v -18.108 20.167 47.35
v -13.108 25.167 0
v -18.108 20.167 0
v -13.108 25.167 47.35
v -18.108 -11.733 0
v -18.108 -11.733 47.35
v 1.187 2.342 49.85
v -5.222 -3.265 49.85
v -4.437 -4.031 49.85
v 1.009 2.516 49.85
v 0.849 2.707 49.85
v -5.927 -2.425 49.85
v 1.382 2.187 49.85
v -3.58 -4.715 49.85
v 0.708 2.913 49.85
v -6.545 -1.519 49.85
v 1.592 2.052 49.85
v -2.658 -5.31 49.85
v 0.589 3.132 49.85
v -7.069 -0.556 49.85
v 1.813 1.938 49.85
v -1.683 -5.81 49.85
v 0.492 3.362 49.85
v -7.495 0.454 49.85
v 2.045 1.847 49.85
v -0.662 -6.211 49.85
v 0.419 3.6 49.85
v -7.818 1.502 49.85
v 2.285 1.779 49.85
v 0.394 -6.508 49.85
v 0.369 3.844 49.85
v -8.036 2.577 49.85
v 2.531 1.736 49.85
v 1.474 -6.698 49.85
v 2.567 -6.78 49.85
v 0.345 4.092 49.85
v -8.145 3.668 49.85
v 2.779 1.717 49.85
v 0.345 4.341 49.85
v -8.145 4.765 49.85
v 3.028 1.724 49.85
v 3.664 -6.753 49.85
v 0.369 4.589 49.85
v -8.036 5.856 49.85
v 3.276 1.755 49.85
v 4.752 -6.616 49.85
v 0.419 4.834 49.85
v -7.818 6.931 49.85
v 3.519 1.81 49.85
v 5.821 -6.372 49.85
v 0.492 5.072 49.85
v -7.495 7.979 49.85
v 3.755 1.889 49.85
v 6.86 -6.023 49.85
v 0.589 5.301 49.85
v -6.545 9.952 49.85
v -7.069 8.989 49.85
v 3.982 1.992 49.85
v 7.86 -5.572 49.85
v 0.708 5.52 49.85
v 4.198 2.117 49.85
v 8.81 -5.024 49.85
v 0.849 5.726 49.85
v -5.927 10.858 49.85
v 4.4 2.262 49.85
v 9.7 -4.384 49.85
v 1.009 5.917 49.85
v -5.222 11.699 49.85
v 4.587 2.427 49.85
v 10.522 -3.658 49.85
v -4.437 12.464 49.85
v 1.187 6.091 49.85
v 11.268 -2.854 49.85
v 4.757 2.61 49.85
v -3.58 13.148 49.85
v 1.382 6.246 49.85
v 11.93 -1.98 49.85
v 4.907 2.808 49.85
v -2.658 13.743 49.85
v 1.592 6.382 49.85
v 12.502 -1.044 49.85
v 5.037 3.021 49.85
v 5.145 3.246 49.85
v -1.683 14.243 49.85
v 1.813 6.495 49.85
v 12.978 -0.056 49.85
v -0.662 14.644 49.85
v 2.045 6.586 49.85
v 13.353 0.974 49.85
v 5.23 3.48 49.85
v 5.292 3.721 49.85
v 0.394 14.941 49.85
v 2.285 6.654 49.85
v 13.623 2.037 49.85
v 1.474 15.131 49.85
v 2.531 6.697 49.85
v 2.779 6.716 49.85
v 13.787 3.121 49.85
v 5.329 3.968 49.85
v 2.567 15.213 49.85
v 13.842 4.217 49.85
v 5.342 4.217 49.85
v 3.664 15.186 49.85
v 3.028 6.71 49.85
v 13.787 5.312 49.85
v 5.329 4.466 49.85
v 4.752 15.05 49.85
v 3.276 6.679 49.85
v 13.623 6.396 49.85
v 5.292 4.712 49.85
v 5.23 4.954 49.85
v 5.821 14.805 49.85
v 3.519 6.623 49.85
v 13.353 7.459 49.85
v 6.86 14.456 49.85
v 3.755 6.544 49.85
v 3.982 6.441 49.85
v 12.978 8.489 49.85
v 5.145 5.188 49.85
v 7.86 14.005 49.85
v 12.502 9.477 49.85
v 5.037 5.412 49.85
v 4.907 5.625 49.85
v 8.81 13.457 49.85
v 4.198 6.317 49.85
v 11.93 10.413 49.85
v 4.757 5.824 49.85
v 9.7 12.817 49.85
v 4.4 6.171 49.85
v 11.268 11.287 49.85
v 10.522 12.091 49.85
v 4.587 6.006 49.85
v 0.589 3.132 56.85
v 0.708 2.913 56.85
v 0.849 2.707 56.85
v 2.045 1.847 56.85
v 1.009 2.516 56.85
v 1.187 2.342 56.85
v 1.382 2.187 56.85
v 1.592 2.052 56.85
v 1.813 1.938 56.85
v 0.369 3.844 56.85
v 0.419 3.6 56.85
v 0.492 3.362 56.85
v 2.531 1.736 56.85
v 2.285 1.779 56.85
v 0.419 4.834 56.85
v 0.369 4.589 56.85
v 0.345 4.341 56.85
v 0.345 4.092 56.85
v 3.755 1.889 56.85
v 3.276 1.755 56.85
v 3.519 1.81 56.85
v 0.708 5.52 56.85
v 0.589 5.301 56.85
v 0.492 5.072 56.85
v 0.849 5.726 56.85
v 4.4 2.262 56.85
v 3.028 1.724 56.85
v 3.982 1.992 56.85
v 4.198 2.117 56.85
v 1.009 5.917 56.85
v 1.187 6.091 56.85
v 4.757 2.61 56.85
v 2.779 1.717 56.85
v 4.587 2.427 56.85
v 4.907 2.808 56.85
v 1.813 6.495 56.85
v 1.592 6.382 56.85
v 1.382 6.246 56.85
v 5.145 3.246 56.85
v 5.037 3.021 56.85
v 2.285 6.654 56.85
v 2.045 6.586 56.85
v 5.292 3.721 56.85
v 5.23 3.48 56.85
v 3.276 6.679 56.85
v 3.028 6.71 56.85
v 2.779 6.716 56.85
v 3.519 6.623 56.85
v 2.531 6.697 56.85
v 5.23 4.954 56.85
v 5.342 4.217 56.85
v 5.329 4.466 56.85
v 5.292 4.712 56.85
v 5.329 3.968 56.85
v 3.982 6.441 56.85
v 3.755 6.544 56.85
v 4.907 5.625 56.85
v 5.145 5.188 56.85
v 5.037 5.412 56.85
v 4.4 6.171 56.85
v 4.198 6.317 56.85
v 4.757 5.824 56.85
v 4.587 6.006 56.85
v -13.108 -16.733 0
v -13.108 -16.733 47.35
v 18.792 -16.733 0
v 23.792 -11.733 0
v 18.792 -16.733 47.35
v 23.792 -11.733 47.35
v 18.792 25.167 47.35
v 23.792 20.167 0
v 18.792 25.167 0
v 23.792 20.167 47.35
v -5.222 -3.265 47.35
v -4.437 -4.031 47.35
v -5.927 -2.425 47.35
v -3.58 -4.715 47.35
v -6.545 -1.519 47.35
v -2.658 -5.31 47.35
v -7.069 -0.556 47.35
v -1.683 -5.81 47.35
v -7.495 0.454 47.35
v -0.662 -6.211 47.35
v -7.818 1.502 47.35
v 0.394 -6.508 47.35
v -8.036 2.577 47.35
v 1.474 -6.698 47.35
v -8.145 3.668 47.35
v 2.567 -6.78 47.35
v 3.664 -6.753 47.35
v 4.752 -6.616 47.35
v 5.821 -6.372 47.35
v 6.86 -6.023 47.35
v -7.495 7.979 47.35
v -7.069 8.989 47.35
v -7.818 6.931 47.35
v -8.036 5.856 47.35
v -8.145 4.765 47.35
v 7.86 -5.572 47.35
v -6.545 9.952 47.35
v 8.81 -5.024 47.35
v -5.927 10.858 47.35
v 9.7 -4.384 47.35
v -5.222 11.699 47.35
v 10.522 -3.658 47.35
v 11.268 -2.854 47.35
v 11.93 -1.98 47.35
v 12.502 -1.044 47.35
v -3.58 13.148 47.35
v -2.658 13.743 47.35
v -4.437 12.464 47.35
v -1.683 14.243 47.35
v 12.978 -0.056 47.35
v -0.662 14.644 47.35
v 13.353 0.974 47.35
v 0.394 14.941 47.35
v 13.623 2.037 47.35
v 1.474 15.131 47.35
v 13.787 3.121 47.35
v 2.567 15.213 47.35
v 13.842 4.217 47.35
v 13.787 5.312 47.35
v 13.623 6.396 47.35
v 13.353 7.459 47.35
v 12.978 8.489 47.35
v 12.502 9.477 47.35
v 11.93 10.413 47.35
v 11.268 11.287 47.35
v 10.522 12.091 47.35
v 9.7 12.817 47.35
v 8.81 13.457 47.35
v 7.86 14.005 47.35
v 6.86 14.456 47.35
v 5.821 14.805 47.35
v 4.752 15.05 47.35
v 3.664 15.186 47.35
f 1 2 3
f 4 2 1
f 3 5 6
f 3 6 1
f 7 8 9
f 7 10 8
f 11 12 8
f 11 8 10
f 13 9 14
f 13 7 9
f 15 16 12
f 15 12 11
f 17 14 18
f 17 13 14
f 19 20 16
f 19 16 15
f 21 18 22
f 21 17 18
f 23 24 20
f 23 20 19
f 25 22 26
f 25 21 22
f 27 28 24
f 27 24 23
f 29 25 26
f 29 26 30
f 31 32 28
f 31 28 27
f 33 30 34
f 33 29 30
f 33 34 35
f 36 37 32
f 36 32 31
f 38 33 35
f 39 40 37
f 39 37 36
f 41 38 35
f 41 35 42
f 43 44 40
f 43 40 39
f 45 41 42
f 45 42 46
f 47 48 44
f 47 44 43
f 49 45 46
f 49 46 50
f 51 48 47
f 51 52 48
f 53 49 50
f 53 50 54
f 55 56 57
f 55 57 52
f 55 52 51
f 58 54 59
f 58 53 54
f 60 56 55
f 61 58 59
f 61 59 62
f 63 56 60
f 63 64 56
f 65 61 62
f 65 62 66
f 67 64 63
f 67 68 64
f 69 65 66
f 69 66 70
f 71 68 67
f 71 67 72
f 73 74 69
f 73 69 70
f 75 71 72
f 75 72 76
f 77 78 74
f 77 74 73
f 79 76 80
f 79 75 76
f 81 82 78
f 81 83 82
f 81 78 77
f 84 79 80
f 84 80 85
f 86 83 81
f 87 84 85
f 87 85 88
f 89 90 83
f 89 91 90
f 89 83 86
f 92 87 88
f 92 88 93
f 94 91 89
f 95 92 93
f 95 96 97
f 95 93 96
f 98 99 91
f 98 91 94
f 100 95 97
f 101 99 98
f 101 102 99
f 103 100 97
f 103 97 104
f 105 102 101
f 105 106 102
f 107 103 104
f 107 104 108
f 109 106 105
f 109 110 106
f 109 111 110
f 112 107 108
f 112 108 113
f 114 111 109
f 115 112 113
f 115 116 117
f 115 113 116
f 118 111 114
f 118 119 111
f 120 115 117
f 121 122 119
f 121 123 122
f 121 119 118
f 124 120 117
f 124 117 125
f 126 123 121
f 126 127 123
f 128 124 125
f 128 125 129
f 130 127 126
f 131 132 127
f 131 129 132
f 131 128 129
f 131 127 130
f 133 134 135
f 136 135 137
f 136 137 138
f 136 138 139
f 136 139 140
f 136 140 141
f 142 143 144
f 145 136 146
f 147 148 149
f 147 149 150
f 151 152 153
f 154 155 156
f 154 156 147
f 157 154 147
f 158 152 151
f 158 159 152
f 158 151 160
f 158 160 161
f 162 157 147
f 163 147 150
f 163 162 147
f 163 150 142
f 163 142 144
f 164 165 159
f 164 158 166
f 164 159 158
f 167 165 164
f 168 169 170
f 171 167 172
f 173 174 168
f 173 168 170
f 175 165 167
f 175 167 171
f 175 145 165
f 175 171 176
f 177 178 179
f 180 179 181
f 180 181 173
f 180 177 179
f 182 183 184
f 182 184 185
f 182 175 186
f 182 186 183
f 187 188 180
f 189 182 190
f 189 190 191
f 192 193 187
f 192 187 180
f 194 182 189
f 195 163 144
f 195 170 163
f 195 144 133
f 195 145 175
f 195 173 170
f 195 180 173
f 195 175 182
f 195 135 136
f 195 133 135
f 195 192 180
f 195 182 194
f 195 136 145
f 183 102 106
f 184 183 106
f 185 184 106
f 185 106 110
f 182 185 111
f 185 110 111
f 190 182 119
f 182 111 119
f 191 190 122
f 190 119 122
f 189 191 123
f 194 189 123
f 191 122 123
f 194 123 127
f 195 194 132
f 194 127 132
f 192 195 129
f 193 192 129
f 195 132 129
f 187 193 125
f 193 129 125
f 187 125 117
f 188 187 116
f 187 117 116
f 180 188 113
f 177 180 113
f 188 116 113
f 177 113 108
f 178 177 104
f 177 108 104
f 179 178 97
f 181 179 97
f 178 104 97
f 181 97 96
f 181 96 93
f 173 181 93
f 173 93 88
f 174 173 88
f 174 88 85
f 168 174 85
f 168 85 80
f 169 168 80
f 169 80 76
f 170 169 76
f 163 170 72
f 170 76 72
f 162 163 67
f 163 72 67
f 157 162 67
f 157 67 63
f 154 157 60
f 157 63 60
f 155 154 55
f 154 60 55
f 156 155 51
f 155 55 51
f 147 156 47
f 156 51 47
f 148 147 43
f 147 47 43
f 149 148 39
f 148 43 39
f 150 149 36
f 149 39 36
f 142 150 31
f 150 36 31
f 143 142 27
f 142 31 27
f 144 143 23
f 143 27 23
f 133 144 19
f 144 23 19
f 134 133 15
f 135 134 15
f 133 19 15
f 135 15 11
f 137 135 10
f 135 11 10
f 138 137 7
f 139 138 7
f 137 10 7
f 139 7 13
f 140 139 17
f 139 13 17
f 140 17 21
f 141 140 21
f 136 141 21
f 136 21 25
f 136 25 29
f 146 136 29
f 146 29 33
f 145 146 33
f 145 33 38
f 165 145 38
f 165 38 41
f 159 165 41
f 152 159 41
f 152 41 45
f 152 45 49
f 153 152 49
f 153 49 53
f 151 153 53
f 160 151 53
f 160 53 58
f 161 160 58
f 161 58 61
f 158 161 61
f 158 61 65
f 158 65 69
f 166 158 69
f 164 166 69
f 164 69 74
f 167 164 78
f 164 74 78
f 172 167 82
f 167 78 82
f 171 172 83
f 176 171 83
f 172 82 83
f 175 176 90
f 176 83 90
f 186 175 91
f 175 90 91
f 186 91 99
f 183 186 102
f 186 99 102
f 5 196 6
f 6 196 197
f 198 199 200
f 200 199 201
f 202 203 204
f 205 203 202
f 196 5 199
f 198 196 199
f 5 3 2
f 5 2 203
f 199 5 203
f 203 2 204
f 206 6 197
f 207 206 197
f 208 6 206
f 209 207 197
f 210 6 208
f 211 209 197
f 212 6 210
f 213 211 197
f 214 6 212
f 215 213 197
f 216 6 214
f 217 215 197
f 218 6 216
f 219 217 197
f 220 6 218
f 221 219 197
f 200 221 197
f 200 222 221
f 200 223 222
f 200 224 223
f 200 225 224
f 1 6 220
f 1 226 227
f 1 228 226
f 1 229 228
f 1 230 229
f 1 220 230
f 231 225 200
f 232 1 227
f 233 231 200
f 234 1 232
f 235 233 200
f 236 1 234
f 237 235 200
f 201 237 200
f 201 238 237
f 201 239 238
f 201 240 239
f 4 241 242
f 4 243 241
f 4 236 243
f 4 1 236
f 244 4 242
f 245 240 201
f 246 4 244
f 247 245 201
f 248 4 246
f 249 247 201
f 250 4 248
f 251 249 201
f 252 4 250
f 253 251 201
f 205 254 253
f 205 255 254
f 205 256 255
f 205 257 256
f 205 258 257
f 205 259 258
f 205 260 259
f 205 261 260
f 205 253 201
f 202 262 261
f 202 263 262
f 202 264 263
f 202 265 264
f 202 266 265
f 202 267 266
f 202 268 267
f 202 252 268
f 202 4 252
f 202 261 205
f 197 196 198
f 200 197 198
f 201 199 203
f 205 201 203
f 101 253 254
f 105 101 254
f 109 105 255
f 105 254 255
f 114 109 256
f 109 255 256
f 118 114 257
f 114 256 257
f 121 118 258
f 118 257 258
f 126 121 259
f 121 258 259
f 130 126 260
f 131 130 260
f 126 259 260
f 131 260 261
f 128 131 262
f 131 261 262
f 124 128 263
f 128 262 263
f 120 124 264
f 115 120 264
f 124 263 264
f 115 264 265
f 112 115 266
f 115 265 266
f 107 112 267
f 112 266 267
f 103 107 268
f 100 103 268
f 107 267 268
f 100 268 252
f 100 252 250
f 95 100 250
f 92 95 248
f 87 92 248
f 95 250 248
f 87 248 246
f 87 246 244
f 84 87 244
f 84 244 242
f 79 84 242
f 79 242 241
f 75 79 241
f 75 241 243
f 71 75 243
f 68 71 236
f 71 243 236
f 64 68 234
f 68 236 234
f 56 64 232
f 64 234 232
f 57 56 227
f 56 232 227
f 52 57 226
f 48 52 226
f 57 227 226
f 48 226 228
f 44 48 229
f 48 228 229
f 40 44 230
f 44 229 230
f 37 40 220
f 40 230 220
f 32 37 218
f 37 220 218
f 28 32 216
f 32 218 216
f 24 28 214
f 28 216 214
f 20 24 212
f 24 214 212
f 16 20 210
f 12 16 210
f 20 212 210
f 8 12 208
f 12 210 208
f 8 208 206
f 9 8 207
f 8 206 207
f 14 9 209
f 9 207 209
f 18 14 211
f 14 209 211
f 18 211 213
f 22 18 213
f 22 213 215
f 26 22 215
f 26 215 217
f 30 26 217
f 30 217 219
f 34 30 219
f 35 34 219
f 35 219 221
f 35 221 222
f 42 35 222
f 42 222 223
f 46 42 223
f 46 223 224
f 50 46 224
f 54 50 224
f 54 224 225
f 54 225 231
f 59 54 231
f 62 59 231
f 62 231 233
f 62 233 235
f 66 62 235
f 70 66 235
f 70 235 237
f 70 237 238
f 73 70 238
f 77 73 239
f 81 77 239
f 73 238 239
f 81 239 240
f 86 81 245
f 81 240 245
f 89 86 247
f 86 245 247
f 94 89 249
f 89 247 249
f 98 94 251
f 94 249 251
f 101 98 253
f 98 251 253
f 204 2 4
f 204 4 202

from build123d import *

# Parameters (mm, degrees)
F0_W     = 41.9
F0_H     = 41.9
F1_DEPTH = 47.35
F2_R     = 11
F3_DEPTH = 2.5
F4_R     = 2.5
F5_DEPTH = 7
F6_SIZE  = 5


with BuildPart() as f1:
    # F0 (on Top) → F1 (new body)
    with BuildSketch(Plane.XY):
        with Locations((2.841542, 4.216616)):
            Rectangle(F0_W, F0_H)
    extrude(amount=F1_DEPTH)

    # F2 (on face) → F3 (join)
    with BuildSketch(Plane.XY.offset(47.35)):
        with Locations((2.841542, 4.216616)):
            Circle(F2_R)
    extrude(amount=F3_DEPTH)

    # F4 (on face) → F5 (join)
    with BuildSketch(Plane.XY.offset(49.85)):
        with Locations((2.841542, 4.216616)):
            Circle(F4_R)
    extrude(amount=F5_DEPTH)

    # F6
    f6_edges = [f1.edges().sort_by_distance(p)[0] for p in [
        (-18.108458, 25.166616, 23.675),
        (-18.108458, -16.733384, 23.675),
        (23.791542, -16.733384, 23.675),
        (23.791542, 25.166616, 23.675),
    ]]
    chamfer(f6_edges, length=F6_SIZE)


solid = f1.part
